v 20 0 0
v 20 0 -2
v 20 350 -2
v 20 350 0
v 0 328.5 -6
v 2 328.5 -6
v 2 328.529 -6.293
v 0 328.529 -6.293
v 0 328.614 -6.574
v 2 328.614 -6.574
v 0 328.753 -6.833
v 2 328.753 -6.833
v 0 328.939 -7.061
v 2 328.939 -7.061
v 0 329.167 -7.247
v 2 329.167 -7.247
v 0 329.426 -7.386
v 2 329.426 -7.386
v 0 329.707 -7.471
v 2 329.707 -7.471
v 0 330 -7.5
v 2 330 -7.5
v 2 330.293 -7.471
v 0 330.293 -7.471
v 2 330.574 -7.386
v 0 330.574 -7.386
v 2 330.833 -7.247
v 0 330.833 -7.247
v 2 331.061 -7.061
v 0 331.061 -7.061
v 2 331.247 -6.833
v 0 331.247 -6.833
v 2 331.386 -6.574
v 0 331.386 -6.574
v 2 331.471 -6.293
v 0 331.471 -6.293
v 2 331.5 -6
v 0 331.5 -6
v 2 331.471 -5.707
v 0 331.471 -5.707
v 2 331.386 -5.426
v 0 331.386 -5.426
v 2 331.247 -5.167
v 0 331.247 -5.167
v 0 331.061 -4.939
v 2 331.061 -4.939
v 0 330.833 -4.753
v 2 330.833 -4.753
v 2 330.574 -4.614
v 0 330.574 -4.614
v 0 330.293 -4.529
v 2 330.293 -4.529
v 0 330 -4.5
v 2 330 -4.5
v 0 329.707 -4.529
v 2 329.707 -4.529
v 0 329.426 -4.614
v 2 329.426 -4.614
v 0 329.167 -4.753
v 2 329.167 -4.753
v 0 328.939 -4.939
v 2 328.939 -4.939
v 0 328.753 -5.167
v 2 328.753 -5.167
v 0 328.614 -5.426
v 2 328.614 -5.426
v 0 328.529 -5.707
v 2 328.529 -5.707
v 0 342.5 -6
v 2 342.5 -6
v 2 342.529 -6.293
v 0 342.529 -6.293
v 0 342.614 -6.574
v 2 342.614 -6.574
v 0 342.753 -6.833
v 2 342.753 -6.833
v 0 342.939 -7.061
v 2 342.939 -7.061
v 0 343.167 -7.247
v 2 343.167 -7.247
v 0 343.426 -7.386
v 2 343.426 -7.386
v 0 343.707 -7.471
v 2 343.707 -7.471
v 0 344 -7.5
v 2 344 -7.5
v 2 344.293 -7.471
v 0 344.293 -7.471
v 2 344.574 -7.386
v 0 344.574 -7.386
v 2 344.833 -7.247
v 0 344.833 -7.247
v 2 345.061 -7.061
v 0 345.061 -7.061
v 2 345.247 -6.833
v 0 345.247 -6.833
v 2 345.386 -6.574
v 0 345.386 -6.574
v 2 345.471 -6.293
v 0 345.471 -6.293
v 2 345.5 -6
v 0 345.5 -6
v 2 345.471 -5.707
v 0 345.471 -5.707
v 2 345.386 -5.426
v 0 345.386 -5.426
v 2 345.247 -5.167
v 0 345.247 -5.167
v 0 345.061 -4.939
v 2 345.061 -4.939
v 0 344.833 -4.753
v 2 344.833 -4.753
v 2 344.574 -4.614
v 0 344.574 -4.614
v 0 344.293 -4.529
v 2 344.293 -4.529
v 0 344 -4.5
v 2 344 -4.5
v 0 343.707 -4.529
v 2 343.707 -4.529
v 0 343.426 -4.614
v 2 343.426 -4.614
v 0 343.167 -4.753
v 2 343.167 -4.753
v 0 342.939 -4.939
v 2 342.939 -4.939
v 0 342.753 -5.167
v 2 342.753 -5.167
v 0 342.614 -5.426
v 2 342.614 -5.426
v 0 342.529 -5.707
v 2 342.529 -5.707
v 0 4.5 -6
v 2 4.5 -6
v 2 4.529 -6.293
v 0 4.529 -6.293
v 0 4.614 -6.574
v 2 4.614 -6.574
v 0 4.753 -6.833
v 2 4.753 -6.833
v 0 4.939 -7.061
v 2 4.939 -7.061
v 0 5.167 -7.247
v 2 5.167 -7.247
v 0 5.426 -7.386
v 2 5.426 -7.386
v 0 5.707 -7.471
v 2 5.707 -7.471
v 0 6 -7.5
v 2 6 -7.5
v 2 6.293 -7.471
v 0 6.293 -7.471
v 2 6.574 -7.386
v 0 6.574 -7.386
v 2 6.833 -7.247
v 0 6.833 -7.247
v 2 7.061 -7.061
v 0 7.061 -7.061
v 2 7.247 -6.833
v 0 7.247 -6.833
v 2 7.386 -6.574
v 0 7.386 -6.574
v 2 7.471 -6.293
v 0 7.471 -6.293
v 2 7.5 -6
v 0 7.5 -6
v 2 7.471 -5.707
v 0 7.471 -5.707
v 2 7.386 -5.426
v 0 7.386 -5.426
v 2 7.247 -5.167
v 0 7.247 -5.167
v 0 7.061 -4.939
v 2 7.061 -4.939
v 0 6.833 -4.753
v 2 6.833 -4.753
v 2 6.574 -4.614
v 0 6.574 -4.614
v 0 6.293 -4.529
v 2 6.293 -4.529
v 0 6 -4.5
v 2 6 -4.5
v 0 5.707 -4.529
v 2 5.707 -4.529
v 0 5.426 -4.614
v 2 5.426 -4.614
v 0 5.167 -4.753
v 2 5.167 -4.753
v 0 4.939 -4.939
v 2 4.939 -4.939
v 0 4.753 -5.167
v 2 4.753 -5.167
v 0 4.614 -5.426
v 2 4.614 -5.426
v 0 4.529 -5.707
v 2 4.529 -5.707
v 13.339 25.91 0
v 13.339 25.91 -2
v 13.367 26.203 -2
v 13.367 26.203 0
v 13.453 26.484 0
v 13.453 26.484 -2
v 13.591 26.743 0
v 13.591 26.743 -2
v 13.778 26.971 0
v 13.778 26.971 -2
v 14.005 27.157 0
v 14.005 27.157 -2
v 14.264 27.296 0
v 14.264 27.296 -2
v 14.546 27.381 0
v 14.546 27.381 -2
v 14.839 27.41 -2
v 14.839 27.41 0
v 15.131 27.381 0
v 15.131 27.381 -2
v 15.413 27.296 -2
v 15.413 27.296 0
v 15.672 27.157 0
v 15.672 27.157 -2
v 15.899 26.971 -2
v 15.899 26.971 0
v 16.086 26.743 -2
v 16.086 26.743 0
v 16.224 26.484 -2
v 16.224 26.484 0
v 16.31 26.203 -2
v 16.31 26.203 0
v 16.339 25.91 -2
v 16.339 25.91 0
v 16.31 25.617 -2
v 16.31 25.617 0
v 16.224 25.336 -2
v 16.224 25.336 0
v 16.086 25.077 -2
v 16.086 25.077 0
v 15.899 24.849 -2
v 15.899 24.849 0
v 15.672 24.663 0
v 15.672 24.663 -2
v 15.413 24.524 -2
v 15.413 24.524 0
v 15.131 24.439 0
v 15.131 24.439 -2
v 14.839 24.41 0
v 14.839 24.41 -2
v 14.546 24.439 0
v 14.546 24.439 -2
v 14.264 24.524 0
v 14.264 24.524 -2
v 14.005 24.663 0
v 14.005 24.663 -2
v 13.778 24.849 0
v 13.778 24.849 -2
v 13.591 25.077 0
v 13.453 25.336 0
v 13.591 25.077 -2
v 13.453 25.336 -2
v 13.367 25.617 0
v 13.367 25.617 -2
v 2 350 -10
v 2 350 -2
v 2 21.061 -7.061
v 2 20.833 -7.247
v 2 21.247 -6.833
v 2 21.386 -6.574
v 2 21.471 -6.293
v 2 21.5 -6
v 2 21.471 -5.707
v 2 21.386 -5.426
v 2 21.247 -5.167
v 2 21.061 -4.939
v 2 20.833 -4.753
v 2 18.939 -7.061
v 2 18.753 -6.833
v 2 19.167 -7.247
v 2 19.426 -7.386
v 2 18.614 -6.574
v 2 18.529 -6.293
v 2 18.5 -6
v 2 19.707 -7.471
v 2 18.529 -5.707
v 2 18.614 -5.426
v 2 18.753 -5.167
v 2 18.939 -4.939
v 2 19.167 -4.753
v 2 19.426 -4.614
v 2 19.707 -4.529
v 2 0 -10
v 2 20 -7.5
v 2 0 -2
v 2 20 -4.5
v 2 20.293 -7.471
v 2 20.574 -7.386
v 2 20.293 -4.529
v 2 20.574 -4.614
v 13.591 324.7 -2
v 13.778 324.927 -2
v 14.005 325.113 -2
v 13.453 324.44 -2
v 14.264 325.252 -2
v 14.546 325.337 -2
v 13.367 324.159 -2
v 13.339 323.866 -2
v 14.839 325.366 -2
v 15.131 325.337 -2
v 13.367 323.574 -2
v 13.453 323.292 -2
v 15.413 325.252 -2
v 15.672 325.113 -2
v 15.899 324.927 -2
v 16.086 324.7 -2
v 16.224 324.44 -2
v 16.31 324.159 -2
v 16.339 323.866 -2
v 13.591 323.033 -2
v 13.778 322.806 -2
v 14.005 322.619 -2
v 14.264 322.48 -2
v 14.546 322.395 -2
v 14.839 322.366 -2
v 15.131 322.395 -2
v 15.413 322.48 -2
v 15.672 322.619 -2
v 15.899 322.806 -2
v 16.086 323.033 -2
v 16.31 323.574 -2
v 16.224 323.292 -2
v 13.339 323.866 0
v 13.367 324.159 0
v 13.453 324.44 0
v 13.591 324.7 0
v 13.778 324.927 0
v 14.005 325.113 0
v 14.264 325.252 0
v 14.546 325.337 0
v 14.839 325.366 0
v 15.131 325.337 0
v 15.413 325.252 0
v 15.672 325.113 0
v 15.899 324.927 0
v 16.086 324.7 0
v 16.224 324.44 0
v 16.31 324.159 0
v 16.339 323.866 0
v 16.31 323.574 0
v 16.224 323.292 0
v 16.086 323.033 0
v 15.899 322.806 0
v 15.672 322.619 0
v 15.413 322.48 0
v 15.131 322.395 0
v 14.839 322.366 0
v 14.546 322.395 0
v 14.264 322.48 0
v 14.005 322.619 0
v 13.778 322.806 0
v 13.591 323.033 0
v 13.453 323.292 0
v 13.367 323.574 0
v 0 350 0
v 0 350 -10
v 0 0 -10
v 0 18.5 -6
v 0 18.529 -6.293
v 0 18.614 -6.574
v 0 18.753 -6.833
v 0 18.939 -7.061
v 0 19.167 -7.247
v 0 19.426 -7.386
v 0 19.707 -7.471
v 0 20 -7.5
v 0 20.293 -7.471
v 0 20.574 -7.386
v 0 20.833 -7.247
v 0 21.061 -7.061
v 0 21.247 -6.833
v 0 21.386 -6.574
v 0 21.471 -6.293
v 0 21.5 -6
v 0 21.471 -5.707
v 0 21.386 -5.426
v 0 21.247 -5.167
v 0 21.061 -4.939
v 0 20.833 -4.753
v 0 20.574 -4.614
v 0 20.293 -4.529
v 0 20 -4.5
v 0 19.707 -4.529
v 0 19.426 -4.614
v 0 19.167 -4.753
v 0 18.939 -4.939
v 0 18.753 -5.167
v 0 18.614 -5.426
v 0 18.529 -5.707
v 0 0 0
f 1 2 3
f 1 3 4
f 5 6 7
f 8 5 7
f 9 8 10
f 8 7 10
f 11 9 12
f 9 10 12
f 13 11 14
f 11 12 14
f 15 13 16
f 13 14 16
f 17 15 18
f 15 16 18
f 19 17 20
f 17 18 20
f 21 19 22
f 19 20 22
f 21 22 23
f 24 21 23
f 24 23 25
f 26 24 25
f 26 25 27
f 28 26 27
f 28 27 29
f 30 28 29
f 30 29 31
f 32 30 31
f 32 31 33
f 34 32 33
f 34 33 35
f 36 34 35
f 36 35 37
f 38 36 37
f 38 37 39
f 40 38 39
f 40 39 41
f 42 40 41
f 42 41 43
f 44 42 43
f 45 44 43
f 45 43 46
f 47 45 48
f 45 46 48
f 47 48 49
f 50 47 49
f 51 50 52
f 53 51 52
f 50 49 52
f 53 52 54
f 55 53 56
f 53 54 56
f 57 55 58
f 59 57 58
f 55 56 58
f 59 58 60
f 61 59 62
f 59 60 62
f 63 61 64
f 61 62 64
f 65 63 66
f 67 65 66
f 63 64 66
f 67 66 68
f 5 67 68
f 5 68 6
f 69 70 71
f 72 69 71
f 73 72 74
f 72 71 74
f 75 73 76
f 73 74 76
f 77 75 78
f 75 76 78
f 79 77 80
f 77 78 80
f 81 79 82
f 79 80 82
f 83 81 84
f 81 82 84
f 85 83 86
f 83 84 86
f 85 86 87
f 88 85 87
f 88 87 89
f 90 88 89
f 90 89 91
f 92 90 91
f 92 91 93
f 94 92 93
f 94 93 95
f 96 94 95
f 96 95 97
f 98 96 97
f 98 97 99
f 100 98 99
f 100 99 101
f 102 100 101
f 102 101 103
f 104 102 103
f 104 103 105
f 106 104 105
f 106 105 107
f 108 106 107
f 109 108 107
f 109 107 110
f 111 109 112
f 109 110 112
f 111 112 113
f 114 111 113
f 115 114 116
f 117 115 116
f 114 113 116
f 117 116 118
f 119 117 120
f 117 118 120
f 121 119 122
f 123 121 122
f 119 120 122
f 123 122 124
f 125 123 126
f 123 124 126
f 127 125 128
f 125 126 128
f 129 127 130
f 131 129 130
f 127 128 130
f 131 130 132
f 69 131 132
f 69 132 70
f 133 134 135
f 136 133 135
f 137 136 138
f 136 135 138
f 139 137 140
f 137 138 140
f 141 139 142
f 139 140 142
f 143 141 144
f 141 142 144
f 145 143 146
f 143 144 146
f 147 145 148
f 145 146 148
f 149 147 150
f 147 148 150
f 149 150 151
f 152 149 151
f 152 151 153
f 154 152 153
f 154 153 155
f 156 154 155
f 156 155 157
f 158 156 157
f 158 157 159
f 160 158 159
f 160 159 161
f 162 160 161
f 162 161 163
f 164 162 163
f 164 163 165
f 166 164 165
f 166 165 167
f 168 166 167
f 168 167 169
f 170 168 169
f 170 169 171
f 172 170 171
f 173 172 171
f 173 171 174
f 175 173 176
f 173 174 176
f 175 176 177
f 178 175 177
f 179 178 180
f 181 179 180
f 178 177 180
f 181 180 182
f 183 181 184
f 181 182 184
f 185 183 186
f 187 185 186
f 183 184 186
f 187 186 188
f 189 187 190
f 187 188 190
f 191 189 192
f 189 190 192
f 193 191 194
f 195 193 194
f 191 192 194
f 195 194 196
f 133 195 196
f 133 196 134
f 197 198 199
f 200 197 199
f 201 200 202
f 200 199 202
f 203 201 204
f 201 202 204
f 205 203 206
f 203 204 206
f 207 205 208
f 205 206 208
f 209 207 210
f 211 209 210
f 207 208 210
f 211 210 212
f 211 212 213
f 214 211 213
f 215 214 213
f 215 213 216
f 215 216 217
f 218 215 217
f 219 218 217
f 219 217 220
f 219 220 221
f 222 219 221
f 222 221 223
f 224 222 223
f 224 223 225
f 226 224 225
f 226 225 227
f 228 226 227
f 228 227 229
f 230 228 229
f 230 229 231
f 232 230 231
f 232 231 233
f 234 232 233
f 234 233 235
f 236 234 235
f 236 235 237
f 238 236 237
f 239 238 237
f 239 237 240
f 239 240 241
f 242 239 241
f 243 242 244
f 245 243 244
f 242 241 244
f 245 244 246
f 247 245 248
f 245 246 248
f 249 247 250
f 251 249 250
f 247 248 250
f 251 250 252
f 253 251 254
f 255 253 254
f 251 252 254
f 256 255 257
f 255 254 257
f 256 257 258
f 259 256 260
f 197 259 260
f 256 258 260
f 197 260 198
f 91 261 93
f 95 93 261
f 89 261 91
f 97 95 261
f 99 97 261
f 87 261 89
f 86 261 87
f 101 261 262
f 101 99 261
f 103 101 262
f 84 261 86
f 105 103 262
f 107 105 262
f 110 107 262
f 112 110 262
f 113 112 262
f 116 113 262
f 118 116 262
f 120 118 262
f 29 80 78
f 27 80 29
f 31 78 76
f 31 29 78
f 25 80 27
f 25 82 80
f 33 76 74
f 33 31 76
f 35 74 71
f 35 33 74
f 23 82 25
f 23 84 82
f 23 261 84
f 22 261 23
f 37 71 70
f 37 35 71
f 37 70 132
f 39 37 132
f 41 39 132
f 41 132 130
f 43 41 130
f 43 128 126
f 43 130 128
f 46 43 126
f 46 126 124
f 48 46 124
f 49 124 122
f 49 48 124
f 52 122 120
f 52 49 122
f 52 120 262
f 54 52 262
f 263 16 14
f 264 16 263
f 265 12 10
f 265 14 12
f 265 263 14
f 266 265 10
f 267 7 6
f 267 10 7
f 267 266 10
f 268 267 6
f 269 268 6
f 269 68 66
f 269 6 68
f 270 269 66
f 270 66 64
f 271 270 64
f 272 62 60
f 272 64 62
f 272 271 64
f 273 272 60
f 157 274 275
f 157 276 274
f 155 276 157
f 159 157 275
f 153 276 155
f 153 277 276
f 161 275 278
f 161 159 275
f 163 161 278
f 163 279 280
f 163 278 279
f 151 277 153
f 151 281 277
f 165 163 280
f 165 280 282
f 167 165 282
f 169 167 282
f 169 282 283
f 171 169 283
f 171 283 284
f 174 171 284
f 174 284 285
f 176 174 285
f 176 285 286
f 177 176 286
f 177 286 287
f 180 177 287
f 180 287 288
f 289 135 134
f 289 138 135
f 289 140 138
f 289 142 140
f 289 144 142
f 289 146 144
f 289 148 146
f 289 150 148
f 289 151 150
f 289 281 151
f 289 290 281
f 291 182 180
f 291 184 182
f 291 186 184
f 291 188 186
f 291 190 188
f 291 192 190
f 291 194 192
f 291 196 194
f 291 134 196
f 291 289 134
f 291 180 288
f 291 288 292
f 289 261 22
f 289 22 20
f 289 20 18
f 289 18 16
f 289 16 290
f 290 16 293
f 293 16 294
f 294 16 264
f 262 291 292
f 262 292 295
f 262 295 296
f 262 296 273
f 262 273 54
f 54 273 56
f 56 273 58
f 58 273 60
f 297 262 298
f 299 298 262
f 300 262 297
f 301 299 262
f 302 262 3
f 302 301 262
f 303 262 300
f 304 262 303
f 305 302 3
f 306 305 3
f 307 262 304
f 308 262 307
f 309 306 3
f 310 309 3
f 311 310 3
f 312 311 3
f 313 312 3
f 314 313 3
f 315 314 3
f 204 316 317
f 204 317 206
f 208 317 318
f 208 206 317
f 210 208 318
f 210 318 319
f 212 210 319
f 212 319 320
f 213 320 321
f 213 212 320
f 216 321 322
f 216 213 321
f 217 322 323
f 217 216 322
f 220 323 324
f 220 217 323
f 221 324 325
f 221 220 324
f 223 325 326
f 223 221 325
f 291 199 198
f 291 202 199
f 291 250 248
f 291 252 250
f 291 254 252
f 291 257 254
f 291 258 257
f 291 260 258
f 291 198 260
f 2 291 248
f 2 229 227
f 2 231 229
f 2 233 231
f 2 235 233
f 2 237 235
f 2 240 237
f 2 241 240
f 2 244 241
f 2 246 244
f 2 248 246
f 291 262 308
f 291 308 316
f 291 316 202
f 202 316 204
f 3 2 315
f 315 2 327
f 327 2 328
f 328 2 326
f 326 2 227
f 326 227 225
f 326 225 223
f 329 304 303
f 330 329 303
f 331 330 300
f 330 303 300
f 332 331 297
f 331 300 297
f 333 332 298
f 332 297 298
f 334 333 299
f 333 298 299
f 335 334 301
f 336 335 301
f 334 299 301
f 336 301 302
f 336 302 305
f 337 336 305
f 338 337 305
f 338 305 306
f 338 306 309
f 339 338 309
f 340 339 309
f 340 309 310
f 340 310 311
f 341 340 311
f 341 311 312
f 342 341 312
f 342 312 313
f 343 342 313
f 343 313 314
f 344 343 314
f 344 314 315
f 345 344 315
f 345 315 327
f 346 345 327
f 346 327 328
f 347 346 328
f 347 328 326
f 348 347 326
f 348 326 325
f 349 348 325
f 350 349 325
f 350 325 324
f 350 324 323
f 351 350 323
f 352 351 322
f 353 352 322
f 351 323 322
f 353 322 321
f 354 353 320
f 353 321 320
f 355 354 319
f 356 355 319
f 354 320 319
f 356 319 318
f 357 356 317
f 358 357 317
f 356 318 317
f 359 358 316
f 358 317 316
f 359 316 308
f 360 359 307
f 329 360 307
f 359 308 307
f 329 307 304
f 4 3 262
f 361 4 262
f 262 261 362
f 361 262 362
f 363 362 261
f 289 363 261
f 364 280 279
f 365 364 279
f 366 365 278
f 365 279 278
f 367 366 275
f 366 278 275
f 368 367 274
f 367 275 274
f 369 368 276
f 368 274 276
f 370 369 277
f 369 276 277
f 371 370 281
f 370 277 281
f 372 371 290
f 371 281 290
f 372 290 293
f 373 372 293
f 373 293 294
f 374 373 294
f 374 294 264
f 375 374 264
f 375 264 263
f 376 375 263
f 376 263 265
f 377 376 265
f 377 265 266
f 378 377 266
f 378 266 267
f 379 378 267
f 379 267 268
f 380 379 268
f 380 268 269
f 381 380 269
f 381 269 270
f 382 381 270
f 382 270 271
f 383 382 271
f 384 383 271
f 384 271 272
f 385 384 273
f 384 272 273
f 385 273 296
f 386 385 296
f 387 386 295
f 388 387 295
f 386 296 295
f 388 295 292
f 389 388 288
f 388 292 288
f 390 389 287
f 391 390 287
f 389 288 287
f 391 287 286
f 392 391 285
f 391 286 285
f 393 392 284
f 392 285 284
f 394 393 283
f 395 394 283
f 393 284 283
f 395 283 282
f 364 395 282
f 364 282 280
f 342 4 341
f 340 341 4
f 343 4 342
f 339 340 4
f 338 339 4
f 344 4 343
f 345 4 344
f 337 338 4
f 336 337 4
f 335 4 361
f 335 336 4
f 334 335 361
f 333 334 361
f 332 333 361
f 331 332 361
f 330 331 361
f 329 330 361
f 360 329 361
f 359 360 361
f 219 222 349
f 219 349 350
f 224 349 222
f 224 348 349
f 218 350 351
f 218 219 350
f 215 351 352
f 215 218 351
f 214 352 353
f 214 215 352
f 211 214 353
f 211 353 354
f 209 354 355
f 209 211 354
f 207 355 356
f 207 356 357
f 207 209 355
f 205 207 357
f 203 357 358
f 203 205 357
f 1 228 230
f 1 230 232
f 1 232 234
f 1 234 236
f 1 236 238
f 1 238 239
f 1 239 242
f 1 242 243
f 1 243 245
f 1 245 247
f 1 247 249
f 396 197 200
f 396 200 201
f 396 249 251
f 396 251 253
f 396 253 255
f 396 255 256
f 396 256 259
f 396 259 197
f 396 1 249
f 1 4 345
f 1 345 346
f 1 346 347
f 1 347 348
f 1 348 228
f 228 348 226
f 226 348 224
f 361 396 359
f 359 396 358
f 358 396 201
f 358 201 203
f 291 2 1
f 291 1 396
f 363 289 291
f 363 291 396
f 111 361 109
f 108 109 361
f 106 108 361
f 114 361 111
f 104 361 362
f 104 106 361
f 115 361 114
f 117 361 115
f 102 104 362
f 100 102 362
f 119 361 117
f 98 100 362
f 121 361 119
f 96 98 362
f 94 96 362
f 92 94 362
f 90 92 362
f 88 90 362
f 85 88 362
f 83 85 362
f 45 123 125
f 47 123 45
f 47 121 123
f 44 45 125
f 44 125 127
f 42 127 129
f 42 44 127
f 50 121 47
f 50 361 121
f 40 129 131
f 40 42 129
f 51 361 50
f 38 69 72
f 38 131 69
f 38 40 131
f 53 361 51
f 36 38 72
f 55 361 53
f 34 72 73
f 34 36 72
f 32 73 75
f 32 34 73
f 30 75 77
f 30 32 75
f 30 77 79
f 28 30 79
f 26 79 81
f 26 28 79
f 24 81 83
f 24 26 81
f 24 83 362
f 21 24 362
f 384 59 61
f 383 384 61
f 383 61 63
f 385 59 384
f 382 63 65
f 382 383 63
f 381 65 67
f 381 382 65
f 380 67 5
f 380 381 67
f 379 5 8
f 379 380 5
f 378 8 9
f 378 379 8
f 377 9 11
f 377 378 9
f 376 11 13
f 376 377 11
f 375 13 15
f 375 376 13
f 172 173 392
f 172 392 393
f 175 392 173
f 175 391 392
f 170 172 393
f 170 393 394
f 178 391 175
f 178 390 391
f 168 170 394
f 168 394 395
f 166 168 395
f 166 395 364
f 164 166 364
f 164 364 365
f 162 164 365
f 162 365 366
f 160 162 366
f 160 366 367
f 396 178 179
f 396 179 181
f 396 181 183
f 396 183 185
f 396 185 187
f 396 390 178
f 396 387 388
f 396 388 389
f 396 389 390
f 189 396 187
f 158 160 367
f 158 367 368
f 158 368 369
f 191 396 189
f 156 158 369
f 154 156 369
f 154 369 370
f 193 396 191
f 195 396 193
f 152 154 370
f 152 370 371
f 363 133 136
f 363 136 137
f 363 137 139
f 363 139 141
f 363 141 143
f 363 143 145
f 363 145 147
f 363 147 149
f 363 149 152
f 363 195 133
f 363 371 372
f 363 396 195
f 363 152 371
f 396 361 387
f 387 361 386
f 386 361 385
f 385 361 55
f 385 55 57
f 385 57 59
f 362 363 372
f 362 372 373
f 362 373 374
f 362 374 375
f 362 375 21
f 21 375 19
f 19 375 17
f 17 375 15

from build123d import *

# Parameters (mm, degrees)
BOSS_EXTRUDE1_DEPTH          = 350
F_3_0_3_DIAMETER_SLOT1_D     = 3
F_3_0_3_DIAMETER_HOLE2_D     = 3
F_3_0_3_DIAMETER_HOLE2_DEPTH = 4


with BuildPart() as part:
    # Sketch1 → Boss-Extrude1 (new body)
    with BuildSketch(Plane(origin=(0, 0, 0), x_dir=(1, 0, 0), z_dir=(0, 1, 0))):
        Polygon((0, 0), (0, 10), (2, 10), (2, 2), (20, 2), (20, 0), align=None)
    extrude(amount=BOSS_EXTRUDE1_DEPTH)

    # Ø3.0 (3) Diameter Slot1 (through all)
    with Locations(Plane.XY):
        with Locations((14.838501141, 25.910104069), (14.838501141, 323.866264903)):
            Hole(F_3_0_3_DIAMETER_SLOT1_D / 2)

    # Ø3.0 (3) Diameter Hole2
    with Locations(Plane(origin=(0, 128.861996081, -176.67995168), x_dir=(0, 1, 0), z_dir=(-1, 0, 0))):
        with Locations((-122.861996081, -170.67995168), (-108.861996081, -170.67995168), (215.138003919, -170.67995168), (201.138003919, -170.67995168)):
            Hole(F_3_0_3_DIAMETER_HOLE2_D / 2, depth=F_3_0_3_DIAMETER_HOLE2_DEPTH)


solid = part.part
